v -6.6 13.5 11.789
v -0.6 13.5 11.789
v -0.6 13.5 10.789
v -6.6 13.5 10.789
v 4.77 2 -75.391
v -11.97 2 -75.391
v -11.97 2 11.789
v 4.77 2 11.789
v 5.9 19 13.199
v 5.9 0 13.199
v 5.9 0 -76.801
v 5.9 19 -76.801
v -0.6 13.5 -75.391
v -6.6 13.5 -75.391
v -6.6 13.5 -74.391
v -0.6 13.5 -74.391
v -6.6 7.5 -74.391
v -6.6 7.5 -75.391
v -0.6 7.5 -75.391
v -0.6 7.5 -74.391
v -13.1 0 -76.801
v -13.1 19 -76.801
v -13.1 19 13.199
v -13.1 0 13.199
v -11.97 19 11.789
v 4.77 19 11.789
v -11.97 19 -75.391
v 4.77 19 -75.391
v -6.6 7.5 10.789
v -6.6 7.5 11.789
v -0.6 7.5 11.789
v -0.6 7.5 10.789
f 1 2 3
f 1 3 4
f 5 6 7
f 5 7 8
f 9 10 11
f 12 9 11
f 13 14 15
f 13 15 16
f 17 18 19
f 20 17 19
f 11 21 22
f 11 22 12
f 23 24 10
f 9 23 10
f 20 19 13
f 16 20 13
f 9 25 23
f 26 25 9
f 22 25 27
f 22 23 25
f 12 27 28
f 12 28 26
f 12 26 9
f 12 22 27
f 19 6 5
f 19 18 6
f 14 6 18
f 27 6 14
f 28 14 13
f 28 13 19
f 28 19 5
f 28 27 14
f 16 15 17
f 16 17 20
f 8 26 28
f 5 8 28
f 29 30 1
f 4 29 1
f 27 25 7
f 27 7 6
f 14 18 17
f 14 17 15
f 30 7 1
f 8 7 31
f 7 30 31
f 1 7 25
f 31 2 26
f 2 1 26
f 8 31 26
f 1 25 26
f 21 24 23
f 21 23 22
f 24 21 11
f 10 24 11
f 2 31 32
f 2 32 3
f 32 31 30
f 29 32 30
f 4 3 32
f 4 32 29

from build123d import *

# Parameters (mm, degrees)
SKETCH1_W           = 19
SKETCH1_H           = 90
BOSS_EXTRUDE2_DEPTH = 19
SKETCH2_W           = 16.74
SKETCH2_H           = 87.18
CUT_EXTRUDE1_DEPTH  = 17
SKETCH3_W           = 6
SKETCH3_H           = 6
BOSS_EXTRUDE4_DEPTH = 1
SKETCH5_W           = 6
SKETCH5_H           = 6
BOSS_EXTRUDE5_DEPTH = 1


with BuildPart() as part:
    # Sketch1 → Boss-Extrude2 (new body)
    with BuildSketch(Plane(origin=(0, 0, 0), x_dir=(1, 0, 0), z_dir=(0, 1, 0))):
        with Locations((-3.599862385, 31.801317605)):
            Rectangle(SKETCH1_W, SKETCH1_H)
    extrude(amount=BOSS_EXTRUDE2_DEPTH)

    # Sketch2 → Cut-Extrude1 (cut)
    with BuildSketch(Plane(origin=(0, 19, 0), x_dir=(1, 0, 0), z_dir=(0, 1, 0))):
        with Locations((-3.599862385, 31.801317605)):
            Rectangle(SKETCH2_W, SKETCH2_H)
    extrude(amount=-CUT_EXTRUDE1_DEPTH, mode=Mode.SUBTRACT)

    # Sketch3 → Boss-Extrude4 (add)
    with BuildSketch(Plane(origin=(0, 0, 11.788682395), x_dir=(-1, 0, 0), z_dir=(0, 0, -1))):
        with Locations((3.599862385, 10.5)):
            Rectangle(SKETCH3_W, SKETCH3_H)
    extrude(amount=BOSS_EXTRUDE4_DEPTH)

    # Sketch5 → Boss-Extrude5 (add)
    with BuildSketch(Plane.XY.offset(-75.391317605)):
        with Locations((-3.599862385, 10.5)):
            Rectangle(SKETCH5_W, SKETCH5_H)
    extrude(amount=BOSS_EXTRUDE5_DEPTH)


solid = part.part
